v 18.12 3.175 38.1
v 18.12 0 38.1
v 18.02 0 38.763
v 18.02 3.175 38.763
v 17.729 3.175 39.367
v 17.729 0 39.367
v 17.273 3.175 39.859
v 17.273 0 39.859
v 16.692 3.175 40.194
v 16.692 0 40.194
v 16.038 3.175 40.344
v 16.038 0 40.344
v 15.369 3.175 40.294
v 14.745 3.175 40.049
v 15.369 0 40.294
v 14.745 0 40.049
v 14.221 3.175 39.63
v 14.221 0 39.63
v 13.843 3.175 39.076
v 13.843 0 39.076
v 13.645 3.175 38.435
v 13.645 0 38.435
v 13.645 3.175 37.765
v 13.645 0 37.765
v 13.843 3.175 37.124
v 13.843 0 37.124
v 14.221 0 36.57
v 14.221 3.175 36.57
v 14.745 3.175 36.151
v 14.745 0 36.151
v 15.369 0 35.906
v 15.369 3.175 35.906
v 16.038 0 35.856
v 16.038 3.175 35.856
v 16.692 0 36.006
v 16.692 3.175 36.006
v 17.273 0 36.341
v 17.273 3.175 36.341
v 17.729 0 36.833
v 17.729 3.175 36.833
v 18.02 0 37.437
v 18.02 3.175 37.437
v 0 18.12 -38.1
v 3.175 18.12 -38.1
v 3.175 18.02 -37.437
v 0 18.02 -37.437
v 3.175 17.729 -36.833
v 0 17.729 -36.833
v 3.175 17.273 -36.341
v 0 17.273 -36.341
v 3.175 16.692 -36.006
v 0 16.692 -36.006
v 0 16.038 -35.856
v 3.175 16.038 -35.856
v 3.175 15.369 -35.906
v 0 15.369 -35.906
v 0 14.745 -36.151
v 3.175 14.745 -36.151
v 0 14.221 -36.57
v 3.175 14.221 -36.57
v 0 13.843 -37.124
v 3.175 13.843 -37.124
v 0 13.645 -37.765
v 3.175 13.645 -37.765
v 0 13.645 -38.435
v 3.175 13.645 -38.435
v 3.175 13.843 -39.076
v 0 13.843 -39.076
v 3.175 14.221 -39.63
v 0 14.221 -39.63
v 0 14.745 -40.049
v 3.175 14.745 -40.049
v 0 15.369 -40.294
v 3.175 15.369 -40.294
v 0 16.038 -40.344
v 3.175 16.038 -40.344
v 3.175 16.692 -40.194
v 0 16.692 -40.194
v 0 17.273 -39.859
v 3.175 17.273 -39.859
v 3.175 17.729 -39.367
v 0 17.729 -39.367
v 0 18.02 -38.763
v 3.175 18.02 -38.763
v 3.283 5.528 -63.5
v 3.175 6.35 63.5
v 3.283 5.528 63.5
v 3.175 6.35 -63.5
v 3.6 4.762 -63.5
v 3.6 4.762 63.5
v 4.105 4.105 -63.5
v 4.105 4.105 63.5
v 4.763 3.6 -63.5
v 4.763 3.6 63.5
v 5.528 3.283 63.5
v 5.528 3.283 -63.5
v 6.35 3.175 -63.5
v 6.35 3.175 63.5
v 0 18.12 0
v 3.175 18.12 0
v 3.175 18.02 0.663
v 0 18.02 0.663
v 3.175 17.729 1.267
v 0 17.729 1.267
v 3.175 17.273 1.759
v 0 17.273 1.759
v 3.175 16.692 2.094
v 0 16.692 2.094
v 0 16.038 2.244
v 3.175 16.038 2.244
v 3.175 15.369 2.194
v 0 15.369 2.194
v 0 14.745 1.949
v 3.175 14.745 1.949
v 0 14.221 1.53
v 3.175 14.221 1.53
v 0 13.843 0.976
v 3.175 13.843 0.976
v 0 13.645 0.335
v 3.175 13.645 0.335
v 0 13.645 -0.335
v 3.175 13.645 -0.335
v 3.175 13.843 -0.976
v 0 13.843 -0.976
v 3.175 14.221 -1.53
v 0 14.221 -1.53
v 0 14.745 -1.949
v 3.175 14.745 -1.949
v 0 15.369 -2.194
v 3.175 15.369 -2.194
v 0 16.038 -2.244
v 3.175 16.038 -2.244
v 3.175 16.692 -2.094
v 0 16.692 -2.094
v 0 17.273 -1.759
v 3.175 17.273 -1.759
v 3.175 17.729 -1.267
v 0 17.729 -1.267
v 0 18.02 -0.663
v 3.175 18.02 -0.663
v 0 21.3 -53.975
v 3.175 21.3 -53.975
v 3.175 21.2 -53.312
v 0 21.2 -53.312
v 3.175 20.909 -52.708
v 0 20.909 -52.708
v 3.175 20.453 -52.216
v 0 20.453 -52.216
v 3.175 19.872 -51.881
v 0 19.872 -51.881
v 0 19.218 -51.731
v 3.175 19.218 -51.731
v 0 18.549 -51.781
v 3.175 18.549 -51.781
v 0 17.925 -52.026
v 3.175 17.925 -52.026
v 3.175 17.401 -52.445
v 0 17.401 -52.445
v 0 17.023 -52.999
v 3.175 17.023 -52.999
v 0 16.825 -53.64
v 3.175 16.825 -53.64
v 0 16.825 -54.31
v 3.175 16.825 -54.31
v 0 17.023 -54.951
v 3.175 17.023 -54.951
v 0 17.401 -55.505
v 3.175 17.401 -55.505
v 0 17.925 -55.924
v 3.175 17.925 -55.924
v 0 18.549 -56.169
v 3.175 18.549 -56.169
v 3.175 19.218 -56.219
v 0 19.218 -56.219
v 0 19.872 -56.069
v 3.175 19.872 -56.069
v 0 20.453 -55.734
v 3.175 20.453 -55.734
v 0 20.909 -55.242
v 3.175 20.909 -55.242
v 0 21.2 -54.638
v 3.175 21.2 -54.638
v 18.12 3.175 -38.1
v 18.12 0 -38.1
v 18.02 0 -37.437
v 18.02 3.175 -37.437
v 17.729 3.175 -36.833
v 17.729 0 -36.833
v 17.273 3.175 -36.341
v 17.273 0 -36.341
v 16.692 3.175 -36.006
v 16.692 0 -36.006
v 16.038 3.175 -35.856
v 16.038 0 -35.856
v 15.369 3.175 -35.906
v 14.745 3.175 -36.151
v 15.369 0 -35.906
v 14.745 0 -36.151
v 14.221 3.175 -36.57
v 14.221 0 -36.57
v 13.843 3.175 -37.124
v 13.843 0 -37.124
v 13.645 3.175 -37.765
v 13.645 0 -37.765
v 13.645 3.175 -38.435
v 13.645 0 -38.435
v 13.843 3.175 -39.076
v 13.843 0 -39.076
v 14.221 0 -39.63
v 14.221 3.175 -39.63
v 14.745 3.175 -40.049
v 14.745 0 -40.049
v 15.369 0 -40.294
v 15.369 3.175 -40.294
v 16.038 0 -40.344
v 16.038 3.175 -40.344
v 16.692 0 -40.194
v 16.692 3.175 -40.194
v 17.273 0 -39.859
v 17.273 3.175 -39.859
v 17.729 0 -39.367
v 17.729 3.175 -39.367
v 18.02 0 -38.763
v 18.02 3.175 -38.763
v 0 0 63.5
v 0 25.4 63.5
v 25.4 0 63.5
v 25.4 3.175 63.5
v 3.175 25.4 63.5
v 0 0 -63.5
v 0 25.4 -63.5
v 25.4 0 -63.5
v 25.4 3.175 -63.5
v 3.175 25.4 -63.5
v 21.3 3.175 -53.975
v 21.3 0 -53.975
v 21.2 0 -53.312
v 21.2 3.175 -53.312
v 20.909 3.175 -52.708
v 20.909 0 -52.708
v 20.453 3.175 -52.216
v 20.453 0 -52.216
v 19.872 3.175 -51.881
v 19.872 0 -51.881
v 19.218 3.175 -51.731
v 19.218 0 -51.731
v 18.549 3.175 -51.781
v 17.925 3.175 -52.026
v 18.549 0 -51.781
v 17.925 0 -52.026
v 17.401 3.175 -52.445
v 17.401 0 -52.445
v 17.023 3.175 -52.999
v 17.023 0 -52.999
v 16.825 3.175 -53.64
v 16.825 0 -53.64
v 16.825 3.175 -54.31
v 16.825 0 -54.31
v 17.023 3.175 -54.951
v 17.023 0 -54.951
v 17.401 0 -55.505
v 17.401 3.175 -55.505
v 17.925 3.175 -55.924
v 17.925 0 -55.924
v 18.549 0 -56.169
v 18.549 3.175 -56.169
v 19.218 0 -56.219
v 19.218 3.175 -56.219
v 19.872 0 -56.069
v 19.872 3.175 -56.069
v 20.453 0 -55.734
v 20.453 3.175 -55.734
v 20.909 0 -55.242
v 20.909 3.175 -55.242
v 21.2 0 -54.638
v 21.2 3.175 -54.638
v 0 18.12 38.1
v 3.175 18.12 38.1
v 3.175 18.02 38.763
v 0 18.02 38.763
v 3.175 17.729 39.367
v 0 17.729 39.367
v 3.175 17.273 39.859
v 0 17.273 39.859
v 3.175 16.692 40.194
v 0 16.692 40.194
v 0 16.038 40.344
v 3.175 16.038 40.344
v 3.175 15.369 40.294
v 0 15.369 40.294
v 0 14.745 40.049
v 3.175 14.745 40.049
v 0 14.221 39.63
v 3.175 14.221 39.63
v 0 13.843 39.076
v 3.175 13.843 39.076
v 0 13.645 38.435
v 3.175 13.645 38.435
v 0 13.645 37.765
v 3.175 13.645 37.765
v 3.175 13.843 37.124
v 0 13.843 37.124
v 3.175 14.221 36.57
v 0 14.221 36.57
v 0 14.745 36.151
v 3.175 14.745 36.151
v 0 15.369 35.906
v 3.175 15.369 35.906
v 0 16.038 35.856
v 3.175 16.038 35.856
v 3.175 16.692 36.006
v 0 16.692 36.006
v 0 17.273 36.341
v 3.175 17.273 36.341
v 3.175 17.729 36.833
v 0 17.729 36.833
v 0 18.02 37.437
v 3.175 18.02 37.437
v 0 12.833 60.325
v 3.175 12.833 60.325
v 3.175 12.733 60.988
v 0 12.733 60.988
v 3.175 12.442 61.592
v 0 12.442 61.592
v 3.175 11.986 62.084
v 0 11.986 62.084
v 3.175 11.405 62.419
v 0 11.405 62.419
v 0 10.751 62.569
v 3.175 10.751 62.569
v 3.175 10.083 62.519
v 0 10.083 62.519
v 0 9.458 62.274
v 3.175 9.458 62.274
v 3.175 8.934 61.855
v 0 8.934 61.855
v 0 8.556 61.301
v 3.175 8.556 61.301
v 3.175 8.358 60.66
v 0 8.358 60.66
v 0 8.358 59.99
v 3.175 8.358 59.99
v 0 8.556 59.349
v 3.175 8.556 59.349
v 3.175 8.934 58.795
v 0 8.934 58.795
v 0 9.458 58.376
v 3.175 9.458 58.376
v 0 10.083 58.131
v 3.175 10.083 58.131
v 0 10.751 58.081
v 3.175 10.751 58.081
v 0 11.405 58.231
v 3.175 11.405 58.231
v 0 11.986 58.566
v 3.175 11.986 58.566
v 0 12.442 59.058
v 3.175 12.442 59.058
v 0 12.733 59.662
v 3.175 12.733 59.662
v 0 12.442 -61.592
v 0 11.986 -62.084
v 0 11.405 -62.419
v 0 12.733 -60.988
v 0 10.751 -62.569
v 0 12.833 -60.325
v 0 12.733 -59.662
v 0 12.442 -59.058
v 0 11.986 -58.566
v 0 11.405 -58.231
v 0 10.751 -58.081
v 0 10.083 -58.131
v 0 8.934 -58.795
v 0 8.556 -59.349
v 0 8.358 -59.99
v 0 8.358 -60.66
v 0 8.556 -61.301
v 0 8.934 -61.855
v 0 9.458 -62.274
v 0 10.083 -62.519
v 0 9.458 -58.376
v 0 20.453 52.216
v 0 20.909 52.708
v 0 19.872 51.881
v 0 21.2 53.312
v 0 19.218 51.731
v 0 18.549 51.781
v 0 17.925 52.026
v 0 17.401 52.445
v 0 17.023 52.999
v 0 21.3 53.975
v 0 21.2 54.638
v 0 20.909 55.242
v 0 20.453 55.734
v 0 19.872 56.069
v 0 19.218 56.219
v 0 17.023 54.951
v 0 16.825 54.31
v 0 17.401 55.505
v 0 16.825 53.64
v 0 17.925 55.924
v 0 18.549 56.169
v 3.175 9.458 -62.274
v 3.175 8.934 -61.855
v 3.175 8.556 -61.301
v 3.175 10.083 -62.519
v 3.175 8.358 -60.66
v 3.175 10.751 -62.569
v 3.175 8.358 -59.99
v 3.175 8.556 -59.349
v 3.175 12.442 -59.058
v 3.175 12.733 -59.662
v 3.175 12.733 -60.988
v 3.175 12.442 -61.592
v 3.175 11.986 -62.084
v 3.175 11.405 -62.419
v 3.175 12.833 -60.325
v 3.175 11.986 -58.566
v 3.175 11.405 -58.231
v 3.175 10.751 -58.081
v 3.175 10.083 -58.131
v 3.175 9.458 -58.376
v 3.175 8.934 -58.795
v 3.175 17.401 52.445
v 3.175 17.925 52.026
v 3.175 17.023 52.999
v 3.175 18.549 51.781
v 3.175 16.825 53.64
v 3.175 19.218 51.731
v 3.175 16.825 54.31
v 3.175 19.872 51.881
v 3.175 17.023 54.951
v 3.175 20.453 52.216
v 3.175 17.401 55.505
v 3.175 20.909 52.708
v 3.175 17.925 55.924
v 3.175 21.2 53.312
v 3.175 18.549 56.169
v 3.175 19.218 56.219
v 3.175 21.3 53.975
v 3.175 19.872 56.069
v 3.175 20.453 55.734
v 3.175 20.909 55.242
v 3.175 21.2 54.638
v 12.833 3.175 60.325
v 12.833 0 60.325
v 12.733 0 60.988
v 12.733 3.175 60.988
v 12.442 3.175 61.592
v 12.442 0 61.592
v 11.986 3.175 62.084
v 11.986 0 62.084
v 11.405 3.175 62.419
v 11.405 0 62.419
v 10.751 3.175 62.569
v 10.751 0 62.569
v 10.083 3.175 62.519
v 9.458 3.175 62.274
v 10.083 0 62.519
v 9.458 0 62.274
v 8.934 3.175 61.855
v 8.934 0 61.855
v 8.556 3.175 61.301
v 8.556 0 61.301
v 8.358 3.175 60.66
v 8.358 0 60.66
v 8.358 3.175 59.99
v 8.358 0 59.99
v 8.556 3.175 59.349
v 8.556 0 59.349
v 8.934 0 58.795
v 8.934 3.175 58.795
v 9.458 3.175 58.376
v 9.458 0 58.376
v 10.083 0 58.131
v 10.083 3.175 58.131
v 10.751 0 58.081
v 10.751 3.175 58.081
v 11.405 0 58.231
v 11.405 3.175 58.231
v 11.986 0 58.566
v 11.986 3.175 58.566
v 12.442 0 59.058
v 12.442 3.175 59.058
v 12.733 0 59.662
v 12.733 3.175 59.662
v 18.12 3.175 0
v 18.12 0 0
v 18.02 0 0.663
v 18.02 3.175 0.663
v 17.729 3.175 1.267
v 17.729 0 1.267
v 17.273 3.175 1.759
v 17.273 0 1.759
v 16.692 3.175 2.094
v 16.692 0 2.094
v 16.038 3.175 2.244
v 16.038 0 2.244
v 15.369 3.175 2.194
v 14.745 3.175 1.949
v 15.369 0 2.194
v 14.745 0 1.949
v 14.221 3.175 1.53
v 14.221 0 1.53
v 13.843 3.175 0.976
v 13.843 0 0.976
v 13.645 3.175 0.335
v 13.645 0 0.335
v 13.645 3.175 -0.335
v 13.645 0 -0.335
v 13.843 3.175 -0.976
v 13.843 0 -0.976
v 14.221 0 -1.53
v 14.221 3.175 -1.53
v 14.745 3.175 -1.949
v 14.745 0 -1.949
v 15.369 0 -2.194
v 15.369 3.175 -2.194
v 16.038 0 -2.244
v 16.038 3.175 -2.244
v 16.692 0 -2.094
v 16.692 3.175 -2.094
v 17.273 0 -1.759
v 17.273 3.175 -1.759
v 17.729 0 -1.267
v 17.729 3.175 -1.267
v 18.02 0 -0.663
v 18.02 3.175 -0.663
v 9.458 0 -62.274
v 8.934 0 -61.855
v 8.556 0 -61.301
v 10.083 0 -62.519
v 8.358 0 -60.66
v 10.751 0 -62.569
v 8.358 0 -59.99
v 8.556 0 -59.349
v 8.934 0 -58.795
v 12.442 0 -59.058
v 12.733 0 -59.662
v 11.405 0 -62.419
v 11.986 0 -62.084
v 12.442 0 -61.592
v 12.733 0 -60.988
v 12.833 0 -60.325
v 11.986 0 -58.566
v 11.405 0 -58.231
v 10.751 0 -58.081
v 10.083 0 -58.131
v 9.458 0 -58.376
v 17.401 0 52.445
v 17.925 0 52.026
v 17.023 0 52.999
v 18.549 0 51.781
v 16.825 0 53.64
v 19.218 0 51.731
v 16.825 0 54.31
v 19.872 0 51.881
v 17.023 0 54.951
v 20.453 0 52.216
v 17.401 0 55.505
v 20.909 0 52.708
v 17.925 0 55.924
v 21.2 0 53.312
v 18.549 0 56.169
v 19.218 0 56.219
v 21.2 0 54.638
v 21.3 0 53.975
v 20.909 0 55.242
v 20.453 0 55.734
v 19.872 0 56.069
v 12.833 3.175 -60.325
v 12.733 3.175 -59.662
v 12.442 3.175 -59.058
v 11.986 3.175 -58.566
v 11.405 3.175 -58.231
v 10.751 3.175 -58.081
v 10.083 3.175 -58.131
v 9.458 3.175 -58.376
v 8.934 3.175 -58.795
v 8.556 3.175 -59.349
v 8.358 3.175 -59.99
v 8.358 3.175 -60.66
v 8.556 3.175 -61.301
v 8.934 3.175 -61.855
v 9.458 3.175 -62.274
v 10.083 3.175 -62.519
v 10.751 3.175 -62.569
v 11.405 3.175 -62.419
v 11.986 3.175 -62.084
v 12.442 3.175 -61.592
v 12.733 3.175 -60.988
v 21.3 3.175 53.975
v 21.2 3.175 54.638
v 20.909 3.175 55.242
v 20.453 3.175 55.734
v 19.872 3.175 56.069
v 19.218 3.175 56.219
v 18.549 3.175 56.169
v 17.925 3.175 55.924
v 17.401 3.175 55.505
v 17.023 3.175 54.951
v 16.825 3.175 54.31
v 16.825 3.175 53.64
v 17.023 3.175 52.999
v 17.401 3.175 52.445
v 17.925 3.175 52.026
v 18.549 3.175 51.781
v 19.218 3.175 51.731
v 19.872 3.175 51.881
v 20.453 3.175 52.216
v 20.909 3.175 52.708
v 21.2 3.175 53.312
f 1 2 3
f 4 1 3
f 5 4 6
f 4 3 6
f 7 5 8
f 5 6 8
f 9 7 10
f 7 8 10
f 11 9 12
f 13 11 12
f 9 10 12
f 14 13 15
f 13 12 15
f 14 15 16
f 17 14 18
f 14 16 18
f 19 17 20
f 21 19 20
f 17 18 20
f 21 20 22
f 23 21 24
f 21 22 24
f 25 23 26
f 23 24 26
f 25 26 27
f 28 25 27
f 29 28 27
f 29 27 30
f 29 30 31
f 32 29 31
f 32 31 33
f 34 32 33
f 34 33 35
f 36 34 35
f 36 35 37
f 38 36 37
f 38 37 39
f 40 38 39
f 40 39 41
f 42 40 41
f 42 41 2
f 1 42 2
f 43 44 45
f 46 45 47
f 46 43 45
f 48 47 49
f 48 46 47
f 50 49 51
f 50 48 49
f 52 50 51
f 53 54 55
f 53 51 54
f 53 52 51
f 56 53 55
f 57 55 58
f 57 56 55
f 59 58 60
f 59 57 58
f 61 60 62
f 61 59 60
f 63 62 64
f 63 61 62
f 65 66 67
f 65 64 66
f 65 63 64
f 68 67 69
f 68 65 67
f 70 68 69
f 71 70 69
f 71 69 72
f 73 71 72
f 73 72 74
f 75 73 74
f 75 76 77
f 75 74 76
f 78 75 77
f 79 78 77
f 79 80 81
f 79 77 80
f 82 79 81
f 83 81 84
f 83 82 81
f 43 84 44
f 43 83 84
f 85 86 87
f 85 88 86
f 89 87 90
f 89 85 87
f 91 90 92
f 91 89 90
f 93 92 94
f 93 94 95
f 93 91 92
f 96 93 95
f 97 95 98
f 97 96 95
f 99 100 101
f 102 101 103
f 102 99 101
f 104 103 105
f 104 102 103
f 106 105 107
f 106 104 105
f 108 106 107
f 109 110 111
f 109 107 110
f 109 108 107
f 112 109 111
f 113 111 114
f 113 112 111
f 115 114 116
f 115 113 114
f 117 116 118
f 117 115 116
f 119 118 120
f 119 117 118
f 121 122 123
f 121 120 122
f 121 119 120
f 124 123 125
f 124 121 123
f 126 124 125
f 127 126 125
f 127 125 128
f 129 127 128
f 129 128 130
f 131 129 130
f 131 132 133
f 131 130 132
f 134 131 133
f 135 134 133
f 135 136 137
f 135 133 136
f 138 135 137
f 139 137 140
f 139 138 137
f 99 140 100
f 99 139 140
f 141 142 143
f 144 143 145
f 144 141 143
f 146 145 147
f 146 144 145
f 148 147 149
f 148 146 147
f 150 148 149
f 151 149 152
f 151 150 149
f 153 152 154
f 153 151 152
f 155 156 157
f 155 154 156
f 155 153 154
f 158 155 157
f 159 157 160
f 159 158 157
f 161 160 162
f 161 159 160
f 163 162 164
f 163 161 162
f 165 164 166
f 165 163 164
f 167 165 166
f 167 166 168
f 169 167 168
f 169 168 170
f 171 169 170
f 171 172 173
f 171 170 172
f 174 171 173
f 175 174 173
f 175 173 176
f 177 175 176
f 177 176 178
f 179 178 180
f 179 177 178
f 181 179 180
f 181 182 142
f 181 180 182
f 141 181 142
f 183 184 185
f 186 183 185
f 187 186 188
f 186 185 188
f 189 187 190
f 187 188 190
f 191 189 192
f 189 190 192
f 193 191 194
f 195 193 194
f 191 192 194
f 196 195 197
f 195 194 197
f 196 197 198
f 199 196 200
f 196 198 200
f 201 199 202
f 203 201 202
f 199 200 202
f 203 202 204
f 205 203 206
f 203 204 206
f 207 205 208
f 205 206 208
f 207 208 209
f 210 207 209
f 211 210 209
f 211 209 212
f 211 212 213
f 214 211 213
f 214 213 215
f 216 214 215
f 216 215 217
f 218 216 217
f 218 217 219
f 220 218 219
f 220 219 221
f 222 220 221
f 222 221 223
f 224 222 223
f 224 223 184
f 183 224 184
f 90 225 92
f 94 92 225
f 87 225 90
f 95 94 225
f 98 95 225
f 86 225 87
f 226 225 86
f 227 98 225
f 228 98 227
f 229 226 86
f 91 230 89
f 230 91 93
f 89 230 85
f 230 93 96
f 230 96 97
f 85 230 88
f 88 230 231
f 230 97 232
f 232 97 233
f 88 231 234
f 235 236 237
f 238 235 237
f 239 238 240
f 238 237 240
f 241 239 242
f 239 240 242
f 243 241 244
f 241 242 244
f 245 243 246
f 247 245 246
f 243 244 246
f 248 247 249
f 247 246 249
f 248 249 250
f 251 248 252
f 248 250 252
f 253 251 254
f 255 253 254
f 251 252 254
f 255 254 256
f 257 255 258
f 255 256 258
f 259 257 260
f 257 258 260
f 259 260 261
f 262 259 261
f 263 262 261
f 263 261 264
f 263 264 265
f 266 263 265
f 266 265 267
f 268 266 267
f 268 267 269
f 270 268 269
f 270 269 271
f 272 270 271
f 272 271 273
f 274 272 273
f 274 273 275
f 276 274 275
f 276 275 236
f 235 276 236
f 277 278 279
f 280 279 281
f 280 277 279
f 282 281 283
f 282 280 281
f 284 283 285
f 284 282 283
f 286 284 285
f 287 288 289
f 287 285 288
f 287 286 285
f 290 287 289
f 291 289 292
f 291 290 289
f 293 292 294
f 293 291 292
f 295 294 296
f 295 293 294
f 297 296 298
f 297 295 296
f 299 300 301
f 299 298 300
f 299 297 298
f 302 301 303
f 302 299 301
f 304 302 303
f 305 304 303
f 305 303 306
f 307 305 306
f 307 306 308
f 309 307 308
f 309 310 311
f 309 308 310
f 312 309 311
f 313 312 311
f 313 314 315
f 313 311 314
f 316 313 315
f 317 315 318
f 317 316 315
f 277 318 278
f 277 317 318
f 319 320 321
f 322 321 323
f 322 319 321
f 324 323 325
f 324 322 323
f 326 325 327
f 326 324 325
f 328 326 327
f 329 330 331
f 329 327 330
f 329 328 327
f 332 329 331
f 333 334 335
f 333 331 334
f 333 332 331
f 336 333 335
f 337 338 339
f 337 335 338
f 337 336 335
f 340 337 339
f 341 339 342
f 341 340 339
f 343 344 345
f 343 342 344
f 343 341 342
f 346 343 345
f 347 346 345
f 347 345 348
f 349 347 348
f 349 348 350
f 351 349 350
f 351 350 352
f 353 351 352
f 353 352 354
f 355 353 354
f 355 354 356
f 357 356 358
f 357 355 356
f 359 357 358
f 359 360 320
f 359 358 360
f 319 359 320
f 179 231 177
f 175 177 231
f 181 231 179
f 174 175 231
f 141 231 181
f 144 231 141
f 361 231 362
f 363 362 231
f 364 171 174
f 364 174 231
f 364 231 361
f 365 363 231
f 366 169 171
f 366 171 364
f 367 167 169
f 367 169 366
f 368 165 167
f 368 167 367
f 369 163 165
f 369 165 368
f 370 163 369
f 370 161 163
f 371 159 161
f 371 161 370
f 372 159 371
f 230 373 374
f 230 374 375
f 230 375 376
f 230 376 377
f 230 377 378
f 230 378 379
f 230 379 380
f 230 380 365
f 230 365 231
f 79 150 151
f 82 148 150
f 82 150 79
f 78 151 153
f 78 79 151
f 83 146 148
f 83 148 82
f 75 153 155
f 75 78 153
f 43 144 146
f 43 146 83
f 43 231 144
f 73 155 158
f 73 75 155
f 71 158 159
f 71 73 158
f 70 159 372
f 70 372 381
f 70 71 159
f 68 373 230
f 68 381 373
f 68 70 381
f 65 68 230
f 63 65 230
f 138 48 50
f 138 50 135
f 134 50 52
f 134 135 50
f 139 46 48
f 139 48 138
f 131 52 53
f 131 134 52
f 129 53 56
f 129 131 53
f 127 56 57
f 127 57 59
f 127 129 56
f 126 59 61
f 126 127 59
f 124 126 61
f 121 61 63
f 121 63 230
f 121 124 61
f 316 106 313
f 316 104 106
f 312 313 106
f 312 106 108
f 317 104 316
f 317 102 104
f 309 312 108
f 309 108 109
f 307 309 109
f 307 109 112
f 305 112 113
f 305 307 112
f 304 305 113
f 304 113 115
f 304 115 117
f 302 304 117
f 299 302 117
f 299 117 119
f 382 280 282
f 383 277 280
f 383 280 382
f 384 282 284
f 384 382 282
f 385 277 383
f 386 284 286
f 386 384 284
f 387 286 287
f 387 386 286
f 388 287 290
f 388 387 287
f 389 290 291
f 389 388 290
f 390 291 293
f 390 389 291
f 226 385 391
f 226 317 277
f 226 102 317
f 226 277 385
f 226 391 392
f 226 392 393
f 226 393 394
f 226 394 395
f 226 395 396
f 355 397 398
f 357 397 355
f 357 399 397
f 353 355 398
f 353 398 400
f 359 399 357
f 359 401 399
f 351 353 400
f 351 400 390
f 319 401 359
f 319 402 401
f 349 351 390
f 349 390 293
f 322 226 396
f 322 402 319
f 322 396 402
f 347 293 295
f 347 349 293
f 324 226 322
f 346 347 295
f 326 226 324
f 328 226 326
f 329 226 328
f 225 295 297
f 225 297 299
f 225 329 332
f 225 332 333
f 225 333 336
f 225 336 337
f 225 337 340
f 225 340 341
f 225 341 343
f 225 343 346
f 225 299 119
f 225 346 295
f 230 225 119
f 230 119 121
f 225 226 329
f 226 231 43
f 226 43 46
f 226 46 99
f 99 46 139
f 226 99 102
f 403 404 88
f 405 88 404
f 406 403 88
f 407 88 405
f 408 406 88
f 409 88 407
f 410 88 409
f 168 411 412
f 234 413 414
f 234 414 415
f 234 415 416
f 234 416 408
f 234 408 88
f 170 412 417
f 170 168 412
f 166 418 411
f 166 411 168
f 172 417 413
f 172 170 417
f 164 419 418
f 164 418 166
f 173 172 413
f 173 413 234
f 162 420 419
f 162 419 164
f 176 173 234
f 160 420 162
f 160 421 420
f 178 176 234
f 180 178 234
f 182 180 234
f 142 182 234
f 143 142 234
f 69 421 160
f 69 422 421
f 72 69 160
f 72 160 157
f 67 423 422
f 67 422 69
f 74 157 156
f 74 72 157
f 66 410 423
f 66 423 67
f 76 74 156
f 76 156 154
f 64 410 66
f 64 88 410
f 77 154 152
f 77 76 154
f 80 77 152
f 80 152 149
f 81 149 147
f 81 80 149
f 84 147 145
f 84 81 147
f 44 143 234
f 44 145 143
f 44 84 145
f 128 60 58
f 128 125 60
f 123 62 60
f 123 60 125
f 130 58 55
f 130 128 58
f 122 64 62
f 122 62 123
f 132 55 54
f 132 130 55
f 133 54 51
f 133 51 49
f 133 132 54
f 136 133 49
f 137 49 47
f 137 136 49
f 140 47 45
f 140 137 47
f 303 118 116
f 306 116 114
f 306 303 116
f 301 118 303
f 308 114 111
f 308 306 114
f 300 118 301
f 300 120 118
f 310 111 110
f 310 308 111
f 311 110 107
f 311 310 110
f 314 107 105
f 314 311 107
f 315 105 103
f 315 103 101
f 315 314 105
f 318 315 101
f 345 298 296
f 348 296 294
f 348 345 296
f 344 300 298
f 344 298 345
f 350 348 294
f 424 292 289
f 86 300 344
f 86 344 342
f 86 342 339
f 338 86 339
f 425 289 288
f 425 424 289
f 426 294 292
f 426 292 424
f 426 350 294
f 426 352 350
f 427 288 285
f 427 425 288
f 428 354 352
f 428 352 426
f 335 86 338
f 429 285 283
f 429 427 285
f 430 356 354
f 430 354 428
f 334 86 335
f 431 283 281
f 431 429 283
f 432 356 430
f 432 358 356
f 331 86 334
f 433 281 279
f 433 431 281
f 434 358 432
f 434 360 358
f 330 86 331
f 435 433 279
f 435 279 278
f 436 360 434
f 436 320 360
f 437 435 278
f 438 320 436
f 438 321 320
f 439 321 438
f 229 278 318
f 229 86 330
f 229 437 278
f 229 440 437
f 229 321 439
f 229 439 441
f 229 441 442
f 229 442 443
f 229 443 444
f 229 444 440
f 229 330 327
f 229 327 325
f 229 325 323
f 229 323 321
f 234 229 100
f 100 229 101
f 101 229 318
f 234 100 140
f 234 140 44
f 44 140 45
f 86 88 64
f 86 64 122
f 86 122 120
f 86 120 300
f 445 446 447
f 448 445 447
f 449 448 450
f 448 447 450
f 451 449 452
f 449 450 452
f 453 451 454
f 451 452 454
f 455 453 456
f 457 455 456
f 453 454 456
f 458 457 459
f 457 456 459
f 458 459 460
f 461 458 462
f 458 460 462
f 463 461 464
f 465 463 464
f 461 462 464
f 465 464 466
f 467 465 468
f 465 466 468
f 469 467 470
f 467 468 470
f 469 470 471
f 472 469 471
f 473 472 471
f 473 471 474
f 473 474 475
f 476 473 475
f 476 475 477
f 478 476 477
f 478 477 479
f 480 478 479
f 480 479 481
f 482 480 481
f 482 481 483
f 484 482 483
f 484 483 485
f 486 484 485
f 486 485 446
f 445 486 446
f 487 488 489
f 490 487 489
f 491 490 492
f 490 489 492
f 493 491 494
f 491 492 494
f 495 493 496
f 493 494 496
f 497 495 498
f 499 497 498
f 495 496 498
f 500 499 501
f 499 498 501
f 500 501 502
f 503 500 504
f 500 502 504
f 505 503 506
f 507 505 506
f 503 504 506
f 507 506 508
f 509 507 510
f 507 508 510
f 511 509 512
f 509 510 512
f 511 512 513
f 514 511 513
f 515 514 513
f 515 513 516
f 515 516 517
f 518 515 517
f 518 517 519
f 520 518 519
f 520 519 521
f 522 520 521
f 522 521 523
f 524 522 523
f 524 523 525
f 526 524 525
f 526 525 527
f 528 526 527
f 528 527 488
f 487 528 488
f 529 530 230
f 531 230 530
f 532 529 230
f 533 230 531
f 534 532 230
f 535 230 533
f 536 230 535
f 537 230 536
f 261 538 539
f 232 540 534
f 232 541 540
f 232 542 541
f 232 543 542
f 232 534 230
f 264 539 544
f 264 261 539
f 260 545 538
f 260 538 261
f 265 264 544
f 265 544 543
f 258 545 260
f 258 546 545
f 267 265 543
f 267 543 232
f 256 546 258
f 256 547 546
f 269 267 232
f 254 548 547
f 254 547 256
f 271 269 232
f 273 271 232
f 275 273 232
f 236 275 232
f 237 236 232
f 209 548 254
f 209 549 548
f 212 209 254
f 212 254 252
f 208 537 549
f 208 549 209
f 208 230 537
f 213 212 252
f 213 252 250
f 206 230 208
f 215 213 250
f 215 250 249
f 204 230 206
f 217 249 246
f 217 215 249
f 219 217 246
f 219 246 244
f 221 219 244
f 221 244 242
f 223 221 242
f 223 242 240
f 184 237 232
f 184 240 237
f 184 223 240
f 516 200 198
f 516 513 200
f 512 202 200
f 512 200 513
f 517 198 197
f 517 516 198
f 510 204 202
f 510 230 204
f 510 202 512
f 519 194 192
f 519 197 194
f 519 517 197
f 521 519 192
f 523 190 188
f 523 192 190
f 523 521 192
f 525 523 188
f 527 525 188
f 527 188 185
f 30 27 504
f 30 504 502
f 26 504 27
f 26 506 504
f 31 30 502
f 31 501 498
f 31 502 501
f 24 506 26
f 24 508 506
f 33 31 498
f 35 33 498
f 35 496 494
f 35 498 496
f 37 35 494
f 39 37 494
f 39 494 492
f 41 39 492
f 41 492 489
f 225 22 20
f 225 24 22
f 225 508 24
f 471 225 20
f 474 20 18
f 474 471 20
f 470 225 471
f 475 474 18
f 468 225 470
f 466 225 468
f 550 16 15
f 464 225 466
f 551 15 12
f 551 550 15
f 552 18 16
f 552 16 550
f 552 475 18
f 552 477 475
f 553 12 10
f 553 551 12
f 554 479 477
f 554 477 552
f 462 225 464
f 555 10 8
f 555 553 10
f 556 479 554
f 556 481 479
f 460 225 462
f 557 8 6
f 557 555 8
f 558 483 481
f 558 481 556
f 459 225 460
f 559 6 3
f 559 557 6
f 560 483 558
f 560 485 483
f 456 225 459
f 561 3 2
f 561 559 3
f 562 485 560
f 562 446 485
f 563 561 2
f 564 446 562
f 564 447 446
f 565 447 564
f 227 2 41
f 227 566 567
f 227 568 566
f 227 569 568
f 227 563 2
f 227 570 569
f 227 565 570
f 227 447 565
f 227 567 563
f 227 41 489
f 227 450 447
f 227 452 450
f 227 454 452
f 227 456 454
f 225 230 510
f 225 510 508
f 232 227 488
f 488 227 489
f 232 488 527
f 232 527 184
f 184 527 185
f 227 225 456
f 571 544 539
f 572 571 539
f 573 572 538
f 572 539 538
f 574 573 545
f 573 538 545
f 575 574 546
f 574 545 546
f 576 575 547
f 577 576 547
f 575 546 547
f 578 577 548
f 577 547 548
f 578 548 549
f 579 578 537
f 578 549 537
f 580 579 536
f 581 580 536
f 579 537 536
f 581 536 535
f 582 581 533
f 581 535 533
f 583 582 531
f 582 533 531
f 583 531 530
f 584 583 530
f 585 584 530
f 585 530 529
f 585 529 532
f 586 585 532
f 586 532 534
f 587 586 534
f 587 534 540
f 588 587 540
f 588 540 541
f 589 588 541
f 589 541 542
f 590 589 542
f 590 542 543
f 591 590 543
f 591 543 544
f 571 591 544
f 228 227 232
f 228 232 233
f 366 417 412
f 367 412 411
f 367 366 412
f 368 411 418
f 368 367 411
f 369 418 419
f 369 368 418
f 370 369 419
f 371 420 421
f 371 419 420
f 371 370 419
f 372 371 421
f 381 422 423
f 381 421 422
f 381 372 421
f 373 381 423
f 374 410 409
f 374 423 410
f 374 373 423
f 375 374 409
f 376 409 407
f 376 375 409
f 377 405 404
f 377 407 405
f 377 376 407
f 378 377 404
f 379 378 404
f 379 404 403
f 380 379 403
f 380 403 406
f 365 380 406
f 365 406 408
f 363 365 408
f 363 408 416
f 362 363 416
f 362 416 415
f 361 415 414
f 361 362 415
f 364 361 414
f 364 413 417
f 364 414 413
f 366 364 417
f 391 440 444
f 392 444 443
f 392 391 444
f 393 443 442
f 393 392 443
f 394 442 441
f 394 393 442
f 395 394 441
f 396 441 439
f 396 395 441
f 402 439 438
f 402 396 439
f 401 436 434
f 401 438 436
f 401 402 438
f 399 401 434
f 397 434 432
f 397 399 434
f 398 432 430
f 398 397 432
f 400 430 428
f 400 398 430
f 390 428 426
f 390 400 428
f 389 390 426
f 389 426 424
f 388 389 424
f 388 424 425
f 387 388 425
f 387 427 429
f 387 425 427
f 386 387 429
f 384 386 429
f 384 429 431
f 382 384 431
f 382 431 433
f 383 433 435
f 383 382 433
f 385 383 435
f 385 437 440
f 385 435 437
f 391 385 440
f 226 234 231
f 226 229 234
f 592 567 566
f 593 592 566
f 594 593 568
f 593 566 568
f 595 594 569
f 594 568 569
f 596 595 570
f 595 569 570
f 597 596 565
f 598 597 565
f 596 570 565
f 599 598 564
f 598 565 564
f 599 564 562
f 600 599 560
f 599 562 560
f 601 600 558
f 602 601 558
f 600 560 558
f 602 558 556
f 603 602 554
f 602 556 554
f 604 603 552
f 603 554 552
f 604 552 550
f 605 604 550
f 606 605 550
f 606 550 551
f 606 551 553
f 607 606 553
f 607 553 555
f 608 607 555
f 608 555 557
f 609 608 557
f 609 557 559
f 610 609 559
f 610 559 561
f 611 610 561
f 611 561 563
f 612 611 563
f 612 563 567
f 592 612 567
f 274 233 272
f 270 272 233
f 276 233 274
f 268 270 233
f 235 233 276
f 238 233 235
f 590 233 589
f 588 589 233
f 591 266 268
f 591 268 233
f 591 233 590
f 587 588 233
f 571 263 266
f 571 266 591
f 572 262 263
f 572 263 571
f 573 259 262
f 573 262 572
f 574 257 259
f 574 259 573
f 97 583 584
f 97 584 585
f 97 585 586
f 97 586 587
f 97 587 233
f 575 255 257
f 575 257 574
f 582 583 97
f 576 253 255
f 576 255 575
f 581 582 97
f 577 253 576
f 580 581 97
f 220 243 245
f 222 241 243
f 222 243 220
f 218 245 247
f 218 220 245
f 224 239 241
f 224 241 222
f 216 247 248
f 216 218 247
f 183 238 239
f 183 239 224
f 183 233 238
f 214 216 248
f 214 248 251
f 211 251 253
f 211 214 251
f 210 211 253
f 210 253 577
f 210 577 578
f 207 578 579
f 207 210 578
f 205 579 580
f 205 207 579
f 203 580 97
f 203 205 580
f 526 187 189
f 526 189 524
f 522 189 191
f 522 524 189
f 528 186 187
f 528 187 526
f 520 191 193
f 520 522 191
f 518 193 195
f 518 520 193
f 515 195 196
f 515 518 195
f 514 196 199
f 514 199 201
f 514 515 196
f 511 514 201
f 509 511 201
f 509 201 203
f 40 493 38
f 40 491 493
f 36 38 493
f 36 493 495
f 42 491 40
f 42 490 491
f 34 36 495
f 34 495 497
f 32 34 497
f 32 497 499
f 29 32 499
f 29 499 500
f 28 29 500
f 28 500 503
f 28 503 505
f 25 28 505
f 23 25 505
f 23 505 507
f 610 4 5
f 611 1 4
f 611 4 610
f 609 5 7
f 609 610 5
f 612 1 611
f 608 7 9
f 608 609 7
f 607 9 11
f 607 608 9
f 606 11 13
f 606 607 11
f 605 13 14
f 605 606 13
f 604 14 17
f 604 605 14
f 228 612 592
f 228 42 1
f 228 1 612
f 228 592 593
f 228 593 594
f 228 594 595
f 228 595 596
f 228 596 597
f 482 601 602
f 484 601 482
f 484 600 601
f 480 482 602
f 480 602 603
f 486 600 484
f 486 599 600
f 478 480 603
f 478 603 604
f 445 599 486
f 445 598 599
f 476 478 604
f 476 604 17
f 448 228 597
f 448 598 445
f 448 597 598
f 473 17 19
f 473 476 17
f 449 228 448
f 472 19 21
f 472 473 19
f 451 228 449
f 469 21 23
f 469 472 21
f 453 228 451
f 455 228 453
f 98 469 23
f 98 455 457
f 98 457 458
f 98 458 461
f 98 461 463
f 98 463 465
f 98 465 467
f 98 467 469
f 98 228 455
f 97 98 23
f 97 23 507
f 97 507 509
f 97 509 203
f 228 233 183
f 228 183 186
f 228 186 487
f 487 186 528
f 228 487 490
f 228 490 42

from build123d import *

# Parameters (mm, degrees)
BOSS_EXTRUDE1_DEPTH = 63.5
FILLET1_R           = 3.175
SKETCH2_R           = 2.25
CUT_EXTRUDE1_DEPTH  = 26.4


with BuildPart() as part:
    # Sketch1 → Boss-Extrude1 (new body, symmetric)
    with BuildSketch(Plane.XY):
        Polygon((0, 25.4), (0, 0), (25.4, 0), (25.4, 3.175), (3.175, 3.175), (3.175, 25.4), align=None)
    extrude(amount=BOSS_EXTRUDE1_DEPTH, both=True)

    # Fillet1
    fillet1_edges = [part.edges().sort_by_distance(p)[0] for p in [
        (3.175, 3.175, 0),
    ]]
    fillet(fillet1_edges, radius=FILLET1_R)

    # Sketch2 → Cut-Extrude1 (cut, through all)
    with BuildSketch(Plane.XZ):
        with Locations((19.05, -53.975)):
            Circle(SKETCH2_R)
        with Locations((10.583333333, -60.325)):
            Circle(SKETCH2_R)
        with Locations((10.583333333, 60.325)):
            Circle(SKETCH2_R)
        with Locations((19.05, 53.975)):
            Circle(SKETCH2_R)
        with Locations((15.87, 38.1)):
            Circle(SKETCH2_R)
        with Locations((15.87, 0)):
            Circle(SKETCH2_R)
        with Locations((15.87, -38.1)):
            Circle(SKETCH2_R)
    cut_extrude1 = extrude(amount=-CUT_EXTRUDE1_DEPTH, mode=Mode.SUBTRACT)

    # Mirror1: Cut-Extrude1 across plane
    add(cut_extrude1.mirror(Plane(origin=(0, 0, 0), x_dir=(0, 0, 1), z_dir=(0.707106781, -0.707106781, 0))), mode=Mode.SUBTRACT)


solid = part.part
